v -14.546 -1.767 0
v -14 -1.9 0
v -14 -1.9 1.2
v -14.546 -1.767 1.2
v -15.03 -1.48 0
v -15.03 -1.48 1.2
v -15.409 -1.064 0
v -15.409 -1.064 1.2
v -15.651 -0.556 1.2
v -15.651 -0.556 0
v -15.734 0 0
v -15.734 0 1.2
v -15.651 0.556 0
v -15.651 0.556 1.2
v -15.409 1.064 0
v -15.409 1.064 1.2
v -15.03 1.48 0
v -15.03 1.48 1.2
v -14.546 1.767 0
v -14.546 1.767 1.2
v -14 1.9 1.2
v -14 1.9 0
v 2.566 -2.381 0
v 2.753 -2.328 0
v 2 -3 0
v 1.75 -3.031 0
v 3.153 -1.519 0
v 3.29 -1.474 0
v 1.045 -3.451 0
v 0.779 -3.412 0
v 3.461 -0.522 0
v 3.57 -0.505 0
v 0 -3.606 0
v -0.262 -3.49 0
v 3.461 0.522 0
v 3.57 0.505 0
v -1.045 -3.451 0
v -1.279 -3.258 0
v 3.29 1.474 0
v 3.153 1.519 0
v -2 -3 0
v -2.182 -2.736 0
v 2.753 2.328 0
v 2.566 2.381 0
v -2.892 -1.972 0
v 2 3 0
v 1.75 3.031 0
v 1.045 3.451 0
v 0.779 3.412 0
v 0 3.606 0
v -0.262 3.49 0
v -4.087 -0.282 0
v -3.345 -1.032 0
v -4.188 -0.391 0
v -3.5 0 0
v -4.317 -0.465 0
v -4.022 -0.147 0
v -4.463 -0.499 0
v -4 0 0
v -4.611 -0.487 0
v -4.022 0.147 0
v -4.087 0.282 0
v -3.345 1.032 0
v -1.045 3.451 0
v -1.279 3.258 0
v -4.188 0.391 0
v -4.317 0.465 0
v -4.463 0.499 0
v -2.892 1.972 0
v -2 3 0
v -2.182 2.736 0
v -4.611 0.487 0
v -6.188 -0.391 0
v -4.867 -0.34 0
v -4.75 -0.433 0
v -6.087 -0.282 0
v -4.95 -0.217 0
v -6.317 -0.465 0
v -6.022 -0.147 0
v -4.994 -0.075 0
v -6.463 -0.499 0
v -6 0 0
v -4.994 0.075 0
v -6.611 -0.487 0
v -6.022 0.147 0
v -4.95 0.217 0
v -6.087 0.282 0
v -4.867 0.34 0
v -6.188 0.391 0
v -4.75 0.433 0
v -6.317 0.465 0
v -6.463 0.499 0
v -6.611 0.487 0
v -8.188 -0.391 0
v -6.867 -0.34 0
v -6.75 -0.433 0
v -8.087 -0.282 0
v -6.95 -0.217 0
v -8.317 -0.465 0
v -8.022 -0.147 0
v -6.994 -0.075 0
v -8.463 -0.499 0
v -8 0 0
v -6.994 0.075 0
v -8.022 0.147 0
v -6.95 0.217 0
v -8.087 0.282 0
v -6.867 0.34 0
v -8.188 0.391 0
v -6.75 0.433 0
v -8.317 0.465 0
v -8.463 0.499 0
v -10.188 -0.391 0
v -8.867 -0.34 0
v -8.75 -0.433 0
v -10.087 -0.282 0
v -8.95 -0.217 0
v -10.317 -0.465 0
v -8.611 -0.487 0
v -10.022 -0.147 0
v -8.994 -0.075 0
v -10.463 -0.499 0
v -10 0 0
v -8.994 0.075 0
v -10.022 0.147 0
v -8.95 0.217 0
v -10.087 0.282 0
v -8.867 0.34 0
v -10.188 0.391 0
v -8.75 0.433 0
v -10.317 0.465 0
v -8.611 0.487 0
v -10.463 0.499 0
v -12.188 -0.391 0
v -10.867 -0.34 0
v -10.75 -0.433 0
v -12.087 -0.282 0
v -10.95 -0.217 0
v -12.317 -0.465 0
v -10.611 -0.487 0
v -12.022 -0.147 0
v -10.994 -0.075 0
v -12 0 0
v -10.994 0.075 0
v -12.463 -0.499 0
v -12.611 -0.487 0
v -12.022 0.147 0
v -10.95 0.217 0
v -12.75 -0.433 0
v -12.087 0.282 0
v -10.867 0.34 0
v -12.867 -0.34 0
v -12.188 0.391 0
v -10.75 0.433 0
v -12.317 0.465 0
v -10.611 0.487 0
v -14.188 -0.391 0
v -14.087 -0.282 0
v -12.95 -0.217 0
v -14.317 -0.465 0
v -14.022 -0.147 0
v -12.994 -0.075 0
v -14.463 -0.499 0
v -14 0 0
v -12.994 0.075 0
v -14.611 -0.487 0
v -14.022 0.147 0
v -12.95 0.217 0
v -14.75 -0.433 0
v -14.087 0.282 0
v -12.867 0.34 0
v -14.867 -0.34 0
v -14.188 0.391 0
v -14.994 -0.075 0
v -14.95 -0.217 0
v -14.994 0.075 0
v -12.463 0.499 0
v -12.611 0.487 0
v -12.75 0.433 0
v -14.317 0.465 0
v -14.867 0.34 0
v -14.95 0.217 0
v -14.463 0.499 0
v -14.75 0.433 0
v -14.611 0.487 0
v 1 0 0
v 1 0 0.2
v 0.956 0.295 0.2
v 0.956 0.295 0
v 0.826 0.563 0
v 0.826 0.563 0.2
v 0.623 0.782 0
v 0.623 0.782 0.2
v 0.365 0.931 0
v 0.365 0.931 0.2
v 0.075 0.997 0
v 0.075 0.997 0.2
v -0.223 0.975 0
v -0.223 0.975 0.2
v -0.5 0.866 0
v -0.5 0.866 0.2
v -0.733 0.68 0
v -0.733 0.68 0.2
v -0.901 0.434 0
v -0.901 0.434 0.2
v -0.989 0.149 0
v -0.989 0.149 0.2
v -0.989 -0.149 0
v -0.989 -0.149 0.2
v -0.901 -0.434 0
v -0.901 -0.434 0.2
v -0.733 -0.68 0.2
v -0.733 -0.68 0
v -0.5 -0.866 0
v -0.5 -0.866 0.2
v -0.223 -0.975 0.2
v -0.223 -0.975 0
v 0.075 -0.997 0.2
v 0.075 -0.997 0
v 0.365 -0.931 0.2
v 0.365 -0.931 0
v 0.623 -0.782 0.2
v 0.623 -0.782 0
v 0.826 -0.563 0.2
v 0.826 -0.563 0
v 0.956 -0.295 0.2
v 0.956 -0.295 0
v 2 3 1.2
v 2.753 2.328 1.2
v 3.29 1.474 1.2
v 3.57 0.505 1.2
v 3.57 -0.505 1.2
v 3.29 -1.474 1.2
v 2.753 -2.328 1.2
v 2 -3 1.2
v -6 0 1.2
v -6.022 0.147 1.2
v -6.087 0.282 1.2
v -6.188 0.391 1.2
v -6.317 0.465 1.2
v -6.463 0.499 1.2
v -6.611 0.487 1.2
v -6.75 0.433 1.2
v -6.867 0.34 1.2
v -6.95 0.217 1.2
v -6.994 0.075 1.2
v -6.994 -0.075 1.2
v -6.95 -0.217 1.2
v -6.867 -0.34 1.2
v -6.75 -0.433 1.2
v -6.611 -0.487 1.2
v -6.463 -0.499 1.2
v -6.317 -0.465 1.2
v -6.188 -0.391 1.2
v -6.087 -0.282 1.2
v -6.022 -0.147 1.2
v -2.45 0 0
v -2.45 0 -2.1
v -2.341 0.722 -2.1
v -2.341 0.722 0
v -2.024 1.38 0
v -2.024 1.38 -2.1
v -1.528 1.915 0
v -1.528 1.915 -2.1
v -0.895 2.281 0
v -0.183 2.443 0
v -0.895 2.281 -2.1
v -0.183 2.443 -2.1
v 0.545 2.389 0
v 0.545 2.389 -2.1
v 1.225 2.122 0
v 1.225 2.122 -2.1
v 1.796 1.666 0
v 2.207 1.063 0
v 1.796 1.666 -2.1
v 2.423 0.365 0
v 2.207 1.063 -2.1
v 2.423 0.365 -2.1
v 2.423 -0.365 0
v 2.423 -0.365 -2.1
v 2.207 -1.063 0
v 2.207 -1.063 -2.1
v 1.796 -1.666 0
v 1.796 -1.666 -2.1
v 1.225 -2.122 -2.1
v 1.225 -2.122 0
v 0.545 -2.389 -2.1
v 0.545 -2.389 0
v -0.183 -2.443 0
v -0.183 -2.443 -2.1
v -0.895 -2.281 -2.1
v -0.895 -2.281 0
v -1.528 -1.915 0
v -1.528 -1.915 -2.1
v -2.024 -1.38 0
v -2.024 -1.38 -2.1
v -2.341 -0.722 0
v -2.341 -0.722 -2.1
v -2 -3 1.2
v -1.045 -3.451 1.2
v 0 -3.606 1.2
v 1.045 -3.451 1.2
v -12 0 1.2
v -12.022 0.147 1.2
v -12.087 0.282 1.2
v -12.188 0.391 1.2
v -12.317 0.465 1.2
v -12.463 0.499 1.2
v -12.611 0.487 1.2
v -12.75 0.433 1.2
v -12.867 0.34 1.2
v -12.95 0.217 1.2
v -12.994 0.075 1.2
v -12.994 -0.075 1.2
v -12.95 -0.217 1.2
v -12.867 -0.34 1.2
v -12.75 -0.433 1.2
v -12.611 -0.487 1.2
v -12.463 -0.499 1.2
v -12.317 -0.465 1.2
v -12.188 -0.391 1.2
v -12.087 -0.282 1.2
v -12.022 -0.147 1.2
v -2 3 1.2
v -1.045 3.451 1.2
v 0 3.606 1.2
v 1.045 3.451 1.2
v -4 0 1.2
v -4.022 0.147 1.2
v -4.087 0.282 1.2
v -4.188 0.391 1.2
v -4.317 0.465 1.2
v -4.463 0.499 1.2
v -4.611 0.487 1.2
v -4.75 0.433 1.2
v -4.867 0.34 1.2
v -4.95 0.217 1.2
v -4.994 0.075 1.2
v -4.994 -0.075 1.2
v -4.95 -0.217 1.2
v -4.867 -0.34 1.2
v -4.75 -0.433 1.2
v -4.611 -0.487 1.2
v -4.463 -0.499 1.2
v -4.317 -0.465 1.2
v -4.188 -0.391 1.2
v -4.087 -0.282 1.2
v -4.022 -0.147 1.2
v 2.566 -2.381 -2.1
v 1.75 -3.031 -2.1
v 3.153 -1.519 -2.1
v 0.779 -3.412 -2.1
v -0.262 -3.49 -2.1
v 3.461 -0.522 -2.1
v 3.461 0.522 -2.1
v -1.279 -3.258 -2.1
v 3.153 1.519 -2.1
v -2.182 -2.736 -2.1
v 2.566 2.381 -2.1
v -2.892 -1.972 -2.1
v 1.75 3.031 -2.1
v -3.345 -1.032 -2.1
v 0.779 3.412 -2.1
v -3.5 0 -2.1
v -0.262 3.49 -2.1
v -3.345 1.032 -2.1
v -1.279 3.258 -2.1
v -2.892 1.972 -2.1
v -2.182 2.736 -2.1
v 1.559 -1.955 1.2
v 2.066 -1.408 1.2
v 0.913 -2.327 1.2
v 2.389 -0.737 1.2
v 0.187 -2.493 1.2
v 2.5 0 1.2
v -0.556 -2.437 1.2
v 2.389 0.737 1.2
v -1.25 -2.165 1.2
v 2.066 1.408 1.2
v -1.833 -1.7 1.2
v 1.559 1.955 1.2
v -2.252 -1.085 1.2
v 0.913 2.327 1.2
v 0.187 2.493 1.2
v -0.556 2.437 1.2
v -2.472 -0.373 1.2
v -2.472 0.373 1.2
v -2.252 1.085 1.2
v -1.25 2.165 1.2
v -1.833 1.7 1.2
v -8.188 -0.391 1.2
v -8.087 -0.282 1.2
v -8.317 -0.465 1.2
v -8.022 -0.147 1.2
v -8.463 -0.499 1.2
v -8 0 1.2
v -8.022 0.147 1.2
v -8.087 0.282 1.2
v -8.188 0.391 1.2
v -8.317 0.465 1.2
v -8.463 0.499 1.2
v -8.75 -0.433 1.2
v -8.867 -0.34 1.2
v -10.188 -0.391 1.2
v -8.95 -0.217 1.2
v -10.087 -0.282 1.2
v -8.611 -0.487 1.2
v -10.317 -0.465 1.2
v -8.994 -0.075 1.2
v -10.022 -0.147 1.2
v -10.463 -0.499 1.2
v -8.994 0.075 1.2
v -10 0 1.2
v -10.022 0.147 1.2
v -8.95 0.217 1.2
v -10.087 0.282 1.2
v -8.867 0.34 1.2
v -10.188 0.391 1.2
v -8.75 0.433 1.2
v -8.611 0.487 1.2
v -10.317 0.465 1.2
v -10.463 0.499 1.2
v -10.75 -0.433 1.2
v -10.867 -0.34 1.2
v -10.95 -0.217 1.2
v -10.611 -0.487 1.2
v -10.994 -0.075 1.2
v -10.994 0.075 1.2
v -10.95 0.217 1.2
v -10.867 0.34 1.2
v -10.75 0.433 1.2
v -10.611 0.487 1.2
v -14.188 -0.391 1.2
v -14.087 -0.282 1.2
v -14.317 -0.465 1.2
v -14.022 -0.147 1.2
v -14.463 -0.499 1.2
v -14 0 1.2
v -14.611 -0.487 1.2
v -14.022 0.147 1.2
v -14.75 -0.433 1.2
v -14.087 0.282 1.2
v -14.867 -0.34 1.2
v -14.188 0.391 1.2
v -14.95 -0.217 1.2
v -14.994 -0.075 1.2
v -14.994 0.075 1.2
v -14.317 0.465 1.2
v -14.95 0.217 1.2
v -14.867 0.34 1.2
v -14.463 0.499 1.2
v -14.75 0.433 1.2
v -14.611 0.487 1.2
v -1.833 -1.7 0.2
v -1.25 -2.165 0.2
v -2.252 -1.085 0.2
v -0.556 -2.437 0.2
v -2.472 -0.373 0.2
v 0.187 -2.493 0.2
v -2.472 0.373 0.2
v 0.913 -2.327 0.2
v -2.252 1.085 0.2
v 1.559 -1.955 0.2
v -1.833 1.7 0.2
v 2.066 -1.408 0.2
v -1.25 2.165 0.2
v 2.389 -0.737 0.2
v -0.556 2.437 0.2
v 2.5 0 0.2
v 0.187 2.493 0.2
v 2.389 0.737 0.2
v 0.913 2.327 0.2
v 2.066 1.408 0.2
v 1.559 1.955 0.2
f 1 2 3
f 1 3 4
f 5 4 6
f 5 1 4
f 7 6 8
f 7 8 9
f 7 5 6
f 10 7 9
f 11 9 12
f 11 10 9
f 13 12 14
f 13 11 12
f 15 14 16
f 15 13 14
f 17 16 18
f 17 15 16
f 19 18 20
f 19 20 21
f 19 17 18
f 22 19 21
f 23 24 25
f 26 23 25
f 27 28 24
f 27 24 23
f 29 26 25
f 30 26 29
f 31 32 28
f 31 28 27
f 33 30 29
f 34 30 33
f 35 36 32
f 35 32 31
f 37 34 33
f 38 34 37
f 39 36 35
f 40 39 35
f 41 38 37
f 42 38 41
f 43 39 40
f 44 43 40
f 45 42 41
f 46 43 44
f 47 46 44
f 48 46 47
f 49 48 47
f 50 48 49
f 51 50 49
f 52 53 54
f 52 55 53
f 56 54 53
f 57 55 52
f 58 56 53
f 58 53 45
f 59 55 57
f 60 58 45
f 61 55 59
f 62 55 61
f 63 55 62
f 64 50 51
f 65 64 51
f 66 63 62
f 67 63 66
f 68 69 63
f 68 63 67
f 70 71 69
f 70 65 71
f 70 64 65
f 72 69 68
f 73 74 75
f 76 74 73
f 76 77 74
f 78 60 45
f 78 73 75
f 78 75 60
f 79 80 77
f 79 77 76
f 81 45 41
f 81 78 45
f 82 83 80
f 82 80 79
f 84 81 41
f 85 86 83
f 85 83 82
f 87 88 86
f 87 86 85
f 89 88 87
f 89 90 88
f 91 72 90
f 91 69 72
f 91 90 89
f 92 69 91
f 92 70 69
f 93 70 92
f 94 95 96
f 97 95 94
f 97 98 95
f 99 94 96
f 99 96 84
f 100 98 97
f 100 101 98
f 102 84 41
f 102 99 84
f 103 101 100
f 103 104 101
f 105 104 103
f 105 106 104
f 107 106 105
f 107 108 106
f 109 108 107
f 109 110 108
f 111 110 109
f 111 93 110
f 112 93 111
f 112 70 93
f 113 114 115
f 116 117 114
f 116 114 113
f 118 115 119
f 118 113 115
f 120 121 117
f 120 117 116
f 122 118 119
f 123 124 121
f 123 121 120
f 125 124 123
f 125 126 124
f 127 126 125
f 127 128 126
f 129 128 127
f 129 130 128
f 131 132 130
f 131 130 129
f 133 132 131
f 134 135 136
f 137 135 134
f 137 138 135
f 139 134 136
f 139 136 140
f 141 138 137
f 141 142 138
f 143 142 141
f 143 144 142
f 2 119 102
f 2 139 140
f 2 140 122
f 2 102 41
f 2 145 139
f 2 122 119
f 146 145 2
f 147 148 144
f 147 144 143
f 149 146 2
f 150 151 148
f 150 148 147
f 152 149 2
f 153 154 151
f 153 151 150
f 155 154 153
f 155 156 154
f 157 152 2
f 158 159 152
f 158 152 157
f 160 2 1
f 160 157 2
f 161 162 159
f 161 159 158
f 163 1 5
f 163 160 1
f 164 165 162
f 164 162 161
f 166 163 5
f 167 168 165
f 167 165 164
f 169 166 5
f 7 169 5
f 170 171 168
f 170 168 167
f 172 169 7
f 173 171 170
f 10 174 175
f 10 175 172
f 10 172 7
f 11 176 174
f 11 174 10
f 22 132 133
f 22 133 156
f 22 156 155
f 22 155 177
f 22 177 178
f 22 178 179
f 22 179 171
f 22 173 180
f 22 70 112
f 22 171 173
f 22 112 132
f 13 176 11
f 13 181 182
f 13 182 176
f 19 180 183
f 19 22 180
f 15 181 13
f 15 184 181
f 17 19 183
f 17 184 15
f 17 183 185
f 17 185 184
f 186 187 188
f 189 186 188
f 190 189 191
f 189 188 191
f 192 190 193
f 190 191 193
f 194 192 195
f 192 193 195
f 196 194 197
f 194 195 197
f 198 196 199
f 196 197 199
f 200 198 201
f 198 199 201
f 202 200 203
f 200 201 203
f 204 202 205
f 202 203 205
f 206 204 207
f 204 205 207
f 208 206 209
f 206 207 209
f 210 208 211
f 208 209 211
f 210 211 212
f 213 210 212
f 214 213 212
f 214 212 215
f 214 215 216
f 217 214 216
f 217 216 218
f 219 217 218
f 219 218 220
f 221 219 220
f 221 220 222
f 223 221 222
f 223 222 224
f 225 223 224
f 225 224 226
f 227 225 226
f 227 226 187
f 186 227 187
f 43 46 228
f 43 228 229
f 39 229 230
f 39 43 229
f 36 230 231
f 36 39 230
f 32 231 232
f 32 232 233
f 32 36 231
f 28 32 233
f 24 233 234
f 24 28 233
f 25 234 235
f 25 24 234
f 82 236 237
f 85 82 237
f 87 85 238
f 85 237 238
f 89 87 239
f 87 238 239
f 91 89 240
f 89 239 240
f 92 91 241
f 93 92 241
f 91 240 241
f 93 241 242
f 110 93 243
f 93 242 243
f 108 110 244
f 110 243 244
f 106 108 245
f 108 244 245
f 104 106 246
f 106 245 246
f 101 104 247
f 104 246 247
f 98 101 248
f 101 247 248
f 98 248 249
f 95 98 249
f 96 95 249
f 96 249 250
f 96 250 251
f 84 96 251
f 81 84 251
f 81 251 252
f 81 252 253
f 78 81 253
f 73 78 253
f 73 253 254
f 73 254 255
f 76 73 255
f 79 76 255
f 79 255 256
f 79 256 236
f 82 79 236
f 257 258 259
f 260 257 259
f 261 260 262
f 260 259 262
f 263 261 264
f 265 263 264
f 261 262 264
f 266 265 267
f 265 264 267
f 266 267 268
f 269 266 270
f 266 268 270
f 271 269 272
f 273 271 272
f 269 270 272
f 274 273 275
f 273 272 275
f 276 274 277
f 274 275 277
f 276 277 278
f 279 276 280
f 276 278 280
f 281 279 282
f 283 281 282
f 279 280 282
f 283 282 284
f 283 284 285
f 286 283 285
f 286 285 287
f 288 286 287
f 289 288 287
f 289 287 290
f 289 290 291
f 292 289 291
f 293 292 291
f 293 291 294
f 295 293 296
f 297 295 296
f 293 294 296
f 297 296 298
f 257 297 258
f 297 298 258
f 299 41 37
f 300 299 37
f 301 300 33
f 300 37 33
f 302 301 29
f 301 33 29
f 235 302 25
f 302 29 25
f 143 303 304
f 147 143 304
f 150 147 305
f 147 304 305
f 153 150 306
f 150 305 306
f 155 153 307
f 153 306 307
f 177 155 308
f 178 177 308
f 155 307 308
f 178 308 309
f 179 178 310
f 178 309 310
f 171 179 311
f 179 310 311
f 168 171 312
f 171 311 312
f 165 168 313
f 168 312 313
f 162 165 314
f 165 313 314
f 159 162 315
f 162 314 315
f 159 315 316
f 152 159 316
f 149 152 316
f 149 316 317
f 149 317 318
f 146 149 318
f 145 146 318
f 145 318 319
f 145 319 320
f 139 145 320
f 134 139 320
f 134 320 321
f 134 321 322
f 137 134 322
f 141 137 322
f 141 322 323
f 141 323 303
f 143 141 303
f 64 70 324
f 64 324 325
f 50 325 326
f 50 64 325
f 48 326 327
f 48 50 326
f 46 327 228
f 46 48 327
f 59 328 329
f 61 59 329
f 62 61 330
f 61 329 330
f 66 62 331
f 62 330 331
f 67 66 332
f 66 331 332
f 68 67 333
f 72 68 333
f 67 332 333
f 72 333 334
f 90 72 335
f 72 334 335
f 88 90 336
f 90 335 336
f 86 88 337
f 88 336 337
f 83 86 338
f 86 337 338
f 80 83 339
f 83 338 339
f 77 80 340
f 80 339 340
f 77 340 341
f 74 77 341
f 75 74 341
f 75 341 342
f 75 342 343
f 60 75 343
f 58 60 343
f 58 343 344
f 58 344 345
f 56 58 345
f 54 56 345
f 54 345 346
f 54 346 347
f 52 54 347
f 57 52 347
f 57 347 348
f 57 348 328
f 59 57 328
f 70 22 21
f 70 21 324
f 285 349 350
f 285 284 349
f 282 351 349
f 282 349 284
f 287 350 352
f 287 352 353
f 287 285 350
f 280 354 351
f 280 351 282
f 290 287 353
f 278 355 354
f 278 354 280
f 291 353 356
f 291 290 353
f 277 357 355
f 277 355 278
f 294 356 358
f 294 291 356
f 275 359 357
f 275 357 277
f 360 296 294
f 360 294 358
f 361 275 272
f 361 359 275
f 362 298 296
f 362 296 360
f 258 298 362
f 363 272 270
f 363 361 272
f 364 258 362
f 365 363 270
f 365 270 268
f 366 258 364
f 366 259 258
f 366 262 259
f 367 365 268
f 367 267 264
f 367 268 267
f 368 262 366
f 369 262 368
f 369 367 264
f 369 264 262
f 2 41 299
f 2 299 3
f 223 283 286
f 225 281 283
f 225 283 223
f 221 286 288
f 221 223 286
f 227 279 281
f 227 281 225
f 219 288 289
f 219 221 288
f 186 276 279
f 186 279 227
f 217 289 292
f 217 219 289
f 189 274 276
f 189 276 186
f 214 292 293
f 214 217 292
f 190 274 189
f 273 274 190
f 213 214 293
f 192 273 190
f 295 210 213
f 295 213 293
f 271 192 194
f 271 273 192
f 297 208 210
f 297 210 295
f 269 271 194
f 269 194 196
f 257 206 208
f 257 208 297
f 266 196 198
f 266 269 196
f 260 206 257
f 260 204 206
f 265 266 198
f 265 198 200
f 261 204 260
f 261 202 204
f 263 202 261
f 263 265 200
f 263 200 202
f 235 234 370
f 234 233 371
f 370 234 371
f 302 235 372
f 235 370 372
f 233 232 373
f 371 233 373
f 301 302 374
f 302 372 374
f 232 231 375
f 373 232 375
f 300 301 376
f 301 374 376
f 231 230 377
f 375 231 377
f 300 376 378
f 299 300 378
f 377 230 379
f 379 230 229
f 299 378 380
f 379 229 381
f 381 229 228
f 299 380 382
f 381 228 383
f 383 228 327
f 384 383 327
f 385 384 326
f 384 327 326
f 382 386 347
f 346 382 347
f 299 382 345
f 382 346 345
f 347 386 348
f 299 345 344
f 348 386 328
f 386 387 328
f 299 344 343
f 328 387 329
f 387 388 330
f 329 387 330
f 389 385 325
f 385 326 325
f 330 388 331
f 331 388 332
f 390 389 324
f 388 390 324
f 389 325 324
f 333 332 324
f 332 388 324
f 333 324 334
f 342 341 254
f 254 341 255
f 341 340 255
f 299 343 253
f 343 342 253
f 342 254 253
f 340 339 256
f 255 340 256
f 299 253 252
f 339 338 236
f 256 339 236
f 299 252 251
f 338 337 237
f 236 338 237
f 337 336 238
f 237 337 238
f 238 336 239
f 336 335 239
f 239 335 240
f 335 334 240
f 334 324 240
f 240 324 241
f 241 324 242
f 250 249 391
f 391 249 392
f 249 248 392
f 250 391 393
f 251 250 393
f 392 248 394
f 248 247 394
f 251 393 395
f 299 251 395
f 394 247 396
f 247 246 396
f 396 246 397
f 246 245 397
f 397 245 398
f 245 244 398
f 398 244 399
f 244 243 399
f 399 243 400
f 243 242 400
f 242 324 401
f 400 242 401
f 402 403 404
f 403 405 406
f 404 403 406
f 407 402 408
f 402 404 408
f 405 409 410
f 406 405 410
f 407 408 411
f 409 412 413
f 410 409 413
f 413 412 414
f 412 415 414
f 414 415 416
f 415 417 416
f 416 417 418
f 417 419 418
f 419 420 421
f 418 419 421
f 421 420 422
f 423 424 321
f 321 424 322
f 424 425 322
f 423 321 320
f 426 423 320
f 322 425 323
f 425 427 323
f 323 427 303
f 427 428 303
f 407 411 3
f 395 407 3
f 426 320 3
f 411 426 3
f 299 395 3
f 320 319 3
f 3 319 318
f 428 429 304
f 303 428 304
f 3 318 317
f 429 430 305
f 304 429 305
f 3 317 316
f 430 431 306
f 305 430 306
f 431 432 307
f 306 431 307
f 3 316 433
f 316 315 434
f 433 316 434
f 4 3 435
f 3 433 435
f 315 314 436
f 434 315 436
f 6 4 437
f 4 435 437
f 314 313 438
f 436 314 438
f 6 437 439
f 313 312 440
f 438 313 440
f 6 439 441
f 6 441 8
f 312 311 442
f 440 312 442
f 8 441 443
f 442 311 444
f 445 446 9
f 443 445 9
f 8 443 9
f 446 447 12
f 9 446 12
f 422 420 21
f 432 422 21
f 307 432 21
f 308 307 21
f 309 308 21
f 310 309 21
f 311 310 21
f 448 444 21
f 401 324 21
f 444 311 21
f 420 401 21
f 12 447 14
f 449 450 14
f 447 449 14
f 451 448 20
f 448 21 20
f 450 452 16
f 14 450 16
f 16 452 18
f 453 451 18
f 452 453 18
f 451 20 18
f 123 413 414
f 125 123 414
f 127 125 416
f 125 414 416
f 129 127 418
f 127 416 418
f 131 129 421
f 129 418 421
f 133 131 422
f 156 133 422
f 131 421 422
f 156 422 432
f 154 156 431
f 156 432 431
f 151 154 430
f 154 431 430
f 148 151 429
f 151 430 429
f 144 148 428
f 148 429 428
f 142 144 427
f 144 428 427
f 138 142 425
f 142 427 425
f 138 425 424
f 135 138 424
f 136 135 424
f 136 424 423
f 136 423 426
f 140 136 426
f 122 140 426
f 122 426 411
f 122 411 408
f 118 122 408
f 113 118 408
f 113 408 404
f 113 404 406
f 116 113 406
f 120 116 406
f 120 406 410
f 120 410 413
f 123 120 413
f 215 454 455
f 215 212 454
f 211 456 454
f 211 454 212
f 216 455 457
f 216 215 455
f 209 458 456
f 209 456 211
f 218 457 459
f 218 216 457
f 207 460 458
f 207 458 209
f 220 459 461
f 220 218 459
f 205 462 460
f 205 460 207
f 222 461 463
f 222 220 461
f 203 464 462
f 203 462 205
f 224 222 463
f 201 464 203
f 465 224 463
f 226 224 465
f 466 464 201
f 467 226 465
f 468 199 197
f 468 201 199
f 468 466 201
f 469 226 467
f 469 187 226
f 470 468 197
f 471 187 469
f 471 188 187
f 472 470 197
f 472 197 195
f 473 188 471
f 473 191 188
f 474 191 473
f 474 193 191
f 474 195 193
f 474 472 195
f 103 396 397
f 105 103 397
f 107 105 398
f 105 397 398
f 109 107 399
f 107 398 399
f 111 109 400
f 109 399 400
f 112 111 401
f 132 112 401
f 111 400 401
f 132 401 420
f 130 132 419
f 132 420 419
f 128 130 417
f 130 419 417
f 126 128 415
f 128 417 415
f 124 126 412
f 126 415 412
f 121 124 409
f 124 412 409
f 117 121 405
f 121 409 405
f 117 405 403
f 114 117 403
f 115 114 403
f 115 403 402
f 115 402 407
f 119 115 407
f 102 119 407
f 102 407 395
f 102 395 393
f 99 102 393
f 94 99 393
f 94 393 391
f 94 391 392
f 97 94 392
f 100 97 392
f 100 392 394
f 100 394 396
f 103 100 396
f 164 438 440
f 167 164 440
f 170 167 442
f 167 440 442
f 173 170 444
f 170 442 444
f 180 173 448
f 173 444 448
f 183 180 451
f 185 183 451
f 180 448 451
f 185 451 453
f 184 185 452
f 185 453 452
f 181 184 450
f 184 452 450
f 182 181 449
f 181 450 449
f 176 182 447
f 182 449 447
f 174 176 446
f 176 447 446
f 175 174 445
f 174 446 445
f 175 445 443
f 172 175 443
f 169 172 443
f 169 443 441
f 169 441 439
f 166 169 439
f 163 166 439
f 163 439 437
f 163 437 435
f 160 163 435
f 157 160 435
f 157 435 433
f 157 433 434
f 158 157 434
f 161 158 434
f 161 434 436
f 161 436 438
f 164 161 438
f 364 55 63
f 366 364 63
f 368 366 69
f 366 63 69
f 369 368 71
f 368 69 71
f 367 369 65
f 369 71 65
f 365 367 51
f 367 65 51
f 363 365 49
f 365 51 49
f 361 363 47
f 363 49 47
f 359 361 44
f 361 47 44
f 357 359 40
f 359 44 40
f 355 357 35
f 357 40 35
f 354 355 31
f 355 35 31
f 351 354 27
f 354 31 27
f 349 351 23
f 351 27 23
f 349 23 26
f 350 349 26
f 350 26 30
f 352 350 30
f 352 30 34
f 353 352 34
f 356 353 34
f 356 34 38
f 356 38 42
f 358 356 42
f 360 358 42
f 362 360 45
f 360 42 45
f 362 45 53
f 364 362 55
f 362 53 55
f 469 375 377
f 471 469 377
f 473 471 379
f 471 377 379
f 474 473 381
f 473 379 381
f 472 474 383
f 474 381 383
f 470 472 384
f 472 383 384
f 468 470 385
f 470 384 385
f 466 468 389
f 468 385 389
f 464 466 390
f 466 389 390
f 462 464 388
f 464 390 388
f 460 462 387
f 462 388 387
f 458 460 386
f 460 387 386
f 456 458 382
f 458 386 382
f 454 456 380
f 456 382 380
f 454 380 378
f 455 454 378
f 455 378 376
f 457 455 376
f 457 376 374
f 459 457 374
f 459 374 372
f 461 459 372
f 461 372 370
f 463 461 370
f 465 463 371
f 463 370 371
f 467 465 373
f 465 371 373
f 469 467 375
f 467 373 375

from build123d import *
from build123d.topology import SkipClean

# Parameters (mm, degrees)
BOSS_EXTRUDE1_DEPTH = 1.2
SKETCH2_R           = 3.5
BOSS_EXTRUDE2_DEPTH = 2.1
SKETCH3_R           = 2.5
CUT_EXTRUDE1_DEPTH  = 1
SKETCH4_R           = 1
CUT_EXTRUDE2_DEPTH  = 19.149516235
SKETCH6_R           = 2.45
CUT_EXTRUDE3_DEPTH  = 2.1
SKETCH8_R           = 0.5
CUT_EXTRUDE5_DEPTH  = 19.303140156
CUT_EXTRUDE6_DEPTH  = 10
CUT_EXTRUDE7_DEPTH  = 10


with BuildPart() as part:
    # Sketch1 → Boss-Extrude1 (new body)
    with BuildSketch(Plane.XY):
        with BuildLine():
            Line((-2, -6.75), (-2, -3))
            Line((-2, -3), (-14, -1.9))
            ThreePointArc((-14, -1.9), (-15.733799273, 0), (-14, 1.9))
            Line((-14, 1.9), (-2, 3))
            Line((-2, 3), (-2, 6.75))
            ThreePointArc((-2, 6.75), (0, 8.75), (2, 6.75))
            Line((2, 6.75), (2, 3))
            Line((2, 3), (14, 1.9))
            ThreePointArc((14, 1.9), (15.733799273, 0), (14, -1.9))
            Line((14, -1.9), (2, -3))
            Line((2, -3), (2, -6.75))
            ThreePointArc((2, -6.75), (0, -8.75), (-2, -6.75))
        make_face()
    extrude(amount=BOSS_EXTRUDE1_DEPTH)

    # Sketch2 → Boss-Extrude2 (add)
    with BuildSketch(Plane(origin=(0, 0, 0), x_dir=(-1, 0, 0), z_dir=(0, 0, -1))):
        Circle(SKETCH2_R)
    extrude(amount=BOSS_EXTRUDE2_DEPTH)

    # Sketch3 → Cut-Extrude1 (cut)
    with BuildSketch(Plane.XY.offset(1.2)):
        Circle(SKETCH3_R)
    extrude(amount=-CUT_EXTRUDE1_DEPTH, mode=Mode.SUBTRACT)

    # Sketch4 → Cut-Extrude2 (cut, through all)
    with BuildSketch(Plane.XY.offset(0.2)):
        Circle(SKETCH4_R)
    extrude(amount=-CUT_EXTRUDE2_DEPTH, mode=Mode.SUBTRACT)

    # Sketch6 → Cut-Extrude3 (cut)
    with BuildSketch(Plane(origin=(0, 0, -2.1), x_dir=(-1, 0, 0), z_dir=(0, 0, -1))):
        Circle(SKETCH6_R)
    extrude(amount=-CUT_EXTRUDE3_DEPTH, mode=Mode.SUBTRACT)

    # Sketch8 → Cut-Extrude5 (cut, through all)
    with BuildSketch(Plane.XY.offset(1.2)):
        with Locations((-4.5, 0)):
            Circle(SKETCH8_R)
        with Locations((-6.5, 0)):
            Circle(SKETCH8_R)
        with Locations((-8.5, 0)):
            Circle(SKETCH8_R)
        with Locations((-10.5, 0)):
            Circle(SKETCH8_R)
        with Locations((-12.5, 0)):
            Circle(SKETCH8_R)
        with Locations((-14.5, 0)):
            Circle(SKETCH8_R)
    extrude(amount=-CUT_EXTRUDE5_DEPTH, mode=Mode.SUBTRACT)

    # Sketch10 → Cut-Extrude6 (cut)
    with BuildSketch(Plane(origin=(0, 0, 0), x_dir=(-1, 0, 0), z_dir=(0, 0, -1))):
        with BuildLine():
            Line((-2, 3), (-3.5, 8.058048999))
            Line((-3.5, 8.058048999), (0.410688034, 10.263711762))
            Line((0.410688034, 10.263711762), (4.972399658, 6.328608878))
            Line((4.972399658, 6.328608878), (2, 3))
            ThreePointArc((2, 3), (0, 3.605551275), (-2, 3))
        make_face()
        with BuildLine():
            Line((-2, -3), (-3.79905406, -6.652770289))
            Line((-3.79905406, -6.652770289), (-0.630835306, -10.284036399))
            Line((-0.630835306, -10.284036399), (2.565835598, -9.787591171))
            Line((2.565835598, -9.787591171), (3.731558209, -4.826385145))
            Line((3.731558209, -4.826385145), (2, -3))
            ThreePointArc((2, -3), (0, -3.605551275), (-2, -3))
        make_face()
    extrude(amount=-CUT_EXTRUDE6_DEPTH, mode=Mode.SUBTRACT)

    # Sketch12 → Cut-Extrude7 (cut)
    with SkipClean():  # the faces are left unmerged after this step: merging them gives an invalid solid
        with BuildSketch(Plane(origin=(0, 0, 0), x_dir=(-1, 0, 0), z_dir=(0, 0, -1))):
            with BuildLine():
                Line((-14, 1.9), (-2, 3))
                ThreePointArc((-2, 3), (-3.605551275, 0), (-2, -3))
                Line((-2, -3), (-14, -1.9))
                ThreePointArc((-14, -1.9), (-15.733799273, 0), (-14, 1.9))
            make_face()
        extrude(amount=-CUT_EXTRUDE7_DEPTH, mode=Mode.SUBTRACT)


solid = part.part
